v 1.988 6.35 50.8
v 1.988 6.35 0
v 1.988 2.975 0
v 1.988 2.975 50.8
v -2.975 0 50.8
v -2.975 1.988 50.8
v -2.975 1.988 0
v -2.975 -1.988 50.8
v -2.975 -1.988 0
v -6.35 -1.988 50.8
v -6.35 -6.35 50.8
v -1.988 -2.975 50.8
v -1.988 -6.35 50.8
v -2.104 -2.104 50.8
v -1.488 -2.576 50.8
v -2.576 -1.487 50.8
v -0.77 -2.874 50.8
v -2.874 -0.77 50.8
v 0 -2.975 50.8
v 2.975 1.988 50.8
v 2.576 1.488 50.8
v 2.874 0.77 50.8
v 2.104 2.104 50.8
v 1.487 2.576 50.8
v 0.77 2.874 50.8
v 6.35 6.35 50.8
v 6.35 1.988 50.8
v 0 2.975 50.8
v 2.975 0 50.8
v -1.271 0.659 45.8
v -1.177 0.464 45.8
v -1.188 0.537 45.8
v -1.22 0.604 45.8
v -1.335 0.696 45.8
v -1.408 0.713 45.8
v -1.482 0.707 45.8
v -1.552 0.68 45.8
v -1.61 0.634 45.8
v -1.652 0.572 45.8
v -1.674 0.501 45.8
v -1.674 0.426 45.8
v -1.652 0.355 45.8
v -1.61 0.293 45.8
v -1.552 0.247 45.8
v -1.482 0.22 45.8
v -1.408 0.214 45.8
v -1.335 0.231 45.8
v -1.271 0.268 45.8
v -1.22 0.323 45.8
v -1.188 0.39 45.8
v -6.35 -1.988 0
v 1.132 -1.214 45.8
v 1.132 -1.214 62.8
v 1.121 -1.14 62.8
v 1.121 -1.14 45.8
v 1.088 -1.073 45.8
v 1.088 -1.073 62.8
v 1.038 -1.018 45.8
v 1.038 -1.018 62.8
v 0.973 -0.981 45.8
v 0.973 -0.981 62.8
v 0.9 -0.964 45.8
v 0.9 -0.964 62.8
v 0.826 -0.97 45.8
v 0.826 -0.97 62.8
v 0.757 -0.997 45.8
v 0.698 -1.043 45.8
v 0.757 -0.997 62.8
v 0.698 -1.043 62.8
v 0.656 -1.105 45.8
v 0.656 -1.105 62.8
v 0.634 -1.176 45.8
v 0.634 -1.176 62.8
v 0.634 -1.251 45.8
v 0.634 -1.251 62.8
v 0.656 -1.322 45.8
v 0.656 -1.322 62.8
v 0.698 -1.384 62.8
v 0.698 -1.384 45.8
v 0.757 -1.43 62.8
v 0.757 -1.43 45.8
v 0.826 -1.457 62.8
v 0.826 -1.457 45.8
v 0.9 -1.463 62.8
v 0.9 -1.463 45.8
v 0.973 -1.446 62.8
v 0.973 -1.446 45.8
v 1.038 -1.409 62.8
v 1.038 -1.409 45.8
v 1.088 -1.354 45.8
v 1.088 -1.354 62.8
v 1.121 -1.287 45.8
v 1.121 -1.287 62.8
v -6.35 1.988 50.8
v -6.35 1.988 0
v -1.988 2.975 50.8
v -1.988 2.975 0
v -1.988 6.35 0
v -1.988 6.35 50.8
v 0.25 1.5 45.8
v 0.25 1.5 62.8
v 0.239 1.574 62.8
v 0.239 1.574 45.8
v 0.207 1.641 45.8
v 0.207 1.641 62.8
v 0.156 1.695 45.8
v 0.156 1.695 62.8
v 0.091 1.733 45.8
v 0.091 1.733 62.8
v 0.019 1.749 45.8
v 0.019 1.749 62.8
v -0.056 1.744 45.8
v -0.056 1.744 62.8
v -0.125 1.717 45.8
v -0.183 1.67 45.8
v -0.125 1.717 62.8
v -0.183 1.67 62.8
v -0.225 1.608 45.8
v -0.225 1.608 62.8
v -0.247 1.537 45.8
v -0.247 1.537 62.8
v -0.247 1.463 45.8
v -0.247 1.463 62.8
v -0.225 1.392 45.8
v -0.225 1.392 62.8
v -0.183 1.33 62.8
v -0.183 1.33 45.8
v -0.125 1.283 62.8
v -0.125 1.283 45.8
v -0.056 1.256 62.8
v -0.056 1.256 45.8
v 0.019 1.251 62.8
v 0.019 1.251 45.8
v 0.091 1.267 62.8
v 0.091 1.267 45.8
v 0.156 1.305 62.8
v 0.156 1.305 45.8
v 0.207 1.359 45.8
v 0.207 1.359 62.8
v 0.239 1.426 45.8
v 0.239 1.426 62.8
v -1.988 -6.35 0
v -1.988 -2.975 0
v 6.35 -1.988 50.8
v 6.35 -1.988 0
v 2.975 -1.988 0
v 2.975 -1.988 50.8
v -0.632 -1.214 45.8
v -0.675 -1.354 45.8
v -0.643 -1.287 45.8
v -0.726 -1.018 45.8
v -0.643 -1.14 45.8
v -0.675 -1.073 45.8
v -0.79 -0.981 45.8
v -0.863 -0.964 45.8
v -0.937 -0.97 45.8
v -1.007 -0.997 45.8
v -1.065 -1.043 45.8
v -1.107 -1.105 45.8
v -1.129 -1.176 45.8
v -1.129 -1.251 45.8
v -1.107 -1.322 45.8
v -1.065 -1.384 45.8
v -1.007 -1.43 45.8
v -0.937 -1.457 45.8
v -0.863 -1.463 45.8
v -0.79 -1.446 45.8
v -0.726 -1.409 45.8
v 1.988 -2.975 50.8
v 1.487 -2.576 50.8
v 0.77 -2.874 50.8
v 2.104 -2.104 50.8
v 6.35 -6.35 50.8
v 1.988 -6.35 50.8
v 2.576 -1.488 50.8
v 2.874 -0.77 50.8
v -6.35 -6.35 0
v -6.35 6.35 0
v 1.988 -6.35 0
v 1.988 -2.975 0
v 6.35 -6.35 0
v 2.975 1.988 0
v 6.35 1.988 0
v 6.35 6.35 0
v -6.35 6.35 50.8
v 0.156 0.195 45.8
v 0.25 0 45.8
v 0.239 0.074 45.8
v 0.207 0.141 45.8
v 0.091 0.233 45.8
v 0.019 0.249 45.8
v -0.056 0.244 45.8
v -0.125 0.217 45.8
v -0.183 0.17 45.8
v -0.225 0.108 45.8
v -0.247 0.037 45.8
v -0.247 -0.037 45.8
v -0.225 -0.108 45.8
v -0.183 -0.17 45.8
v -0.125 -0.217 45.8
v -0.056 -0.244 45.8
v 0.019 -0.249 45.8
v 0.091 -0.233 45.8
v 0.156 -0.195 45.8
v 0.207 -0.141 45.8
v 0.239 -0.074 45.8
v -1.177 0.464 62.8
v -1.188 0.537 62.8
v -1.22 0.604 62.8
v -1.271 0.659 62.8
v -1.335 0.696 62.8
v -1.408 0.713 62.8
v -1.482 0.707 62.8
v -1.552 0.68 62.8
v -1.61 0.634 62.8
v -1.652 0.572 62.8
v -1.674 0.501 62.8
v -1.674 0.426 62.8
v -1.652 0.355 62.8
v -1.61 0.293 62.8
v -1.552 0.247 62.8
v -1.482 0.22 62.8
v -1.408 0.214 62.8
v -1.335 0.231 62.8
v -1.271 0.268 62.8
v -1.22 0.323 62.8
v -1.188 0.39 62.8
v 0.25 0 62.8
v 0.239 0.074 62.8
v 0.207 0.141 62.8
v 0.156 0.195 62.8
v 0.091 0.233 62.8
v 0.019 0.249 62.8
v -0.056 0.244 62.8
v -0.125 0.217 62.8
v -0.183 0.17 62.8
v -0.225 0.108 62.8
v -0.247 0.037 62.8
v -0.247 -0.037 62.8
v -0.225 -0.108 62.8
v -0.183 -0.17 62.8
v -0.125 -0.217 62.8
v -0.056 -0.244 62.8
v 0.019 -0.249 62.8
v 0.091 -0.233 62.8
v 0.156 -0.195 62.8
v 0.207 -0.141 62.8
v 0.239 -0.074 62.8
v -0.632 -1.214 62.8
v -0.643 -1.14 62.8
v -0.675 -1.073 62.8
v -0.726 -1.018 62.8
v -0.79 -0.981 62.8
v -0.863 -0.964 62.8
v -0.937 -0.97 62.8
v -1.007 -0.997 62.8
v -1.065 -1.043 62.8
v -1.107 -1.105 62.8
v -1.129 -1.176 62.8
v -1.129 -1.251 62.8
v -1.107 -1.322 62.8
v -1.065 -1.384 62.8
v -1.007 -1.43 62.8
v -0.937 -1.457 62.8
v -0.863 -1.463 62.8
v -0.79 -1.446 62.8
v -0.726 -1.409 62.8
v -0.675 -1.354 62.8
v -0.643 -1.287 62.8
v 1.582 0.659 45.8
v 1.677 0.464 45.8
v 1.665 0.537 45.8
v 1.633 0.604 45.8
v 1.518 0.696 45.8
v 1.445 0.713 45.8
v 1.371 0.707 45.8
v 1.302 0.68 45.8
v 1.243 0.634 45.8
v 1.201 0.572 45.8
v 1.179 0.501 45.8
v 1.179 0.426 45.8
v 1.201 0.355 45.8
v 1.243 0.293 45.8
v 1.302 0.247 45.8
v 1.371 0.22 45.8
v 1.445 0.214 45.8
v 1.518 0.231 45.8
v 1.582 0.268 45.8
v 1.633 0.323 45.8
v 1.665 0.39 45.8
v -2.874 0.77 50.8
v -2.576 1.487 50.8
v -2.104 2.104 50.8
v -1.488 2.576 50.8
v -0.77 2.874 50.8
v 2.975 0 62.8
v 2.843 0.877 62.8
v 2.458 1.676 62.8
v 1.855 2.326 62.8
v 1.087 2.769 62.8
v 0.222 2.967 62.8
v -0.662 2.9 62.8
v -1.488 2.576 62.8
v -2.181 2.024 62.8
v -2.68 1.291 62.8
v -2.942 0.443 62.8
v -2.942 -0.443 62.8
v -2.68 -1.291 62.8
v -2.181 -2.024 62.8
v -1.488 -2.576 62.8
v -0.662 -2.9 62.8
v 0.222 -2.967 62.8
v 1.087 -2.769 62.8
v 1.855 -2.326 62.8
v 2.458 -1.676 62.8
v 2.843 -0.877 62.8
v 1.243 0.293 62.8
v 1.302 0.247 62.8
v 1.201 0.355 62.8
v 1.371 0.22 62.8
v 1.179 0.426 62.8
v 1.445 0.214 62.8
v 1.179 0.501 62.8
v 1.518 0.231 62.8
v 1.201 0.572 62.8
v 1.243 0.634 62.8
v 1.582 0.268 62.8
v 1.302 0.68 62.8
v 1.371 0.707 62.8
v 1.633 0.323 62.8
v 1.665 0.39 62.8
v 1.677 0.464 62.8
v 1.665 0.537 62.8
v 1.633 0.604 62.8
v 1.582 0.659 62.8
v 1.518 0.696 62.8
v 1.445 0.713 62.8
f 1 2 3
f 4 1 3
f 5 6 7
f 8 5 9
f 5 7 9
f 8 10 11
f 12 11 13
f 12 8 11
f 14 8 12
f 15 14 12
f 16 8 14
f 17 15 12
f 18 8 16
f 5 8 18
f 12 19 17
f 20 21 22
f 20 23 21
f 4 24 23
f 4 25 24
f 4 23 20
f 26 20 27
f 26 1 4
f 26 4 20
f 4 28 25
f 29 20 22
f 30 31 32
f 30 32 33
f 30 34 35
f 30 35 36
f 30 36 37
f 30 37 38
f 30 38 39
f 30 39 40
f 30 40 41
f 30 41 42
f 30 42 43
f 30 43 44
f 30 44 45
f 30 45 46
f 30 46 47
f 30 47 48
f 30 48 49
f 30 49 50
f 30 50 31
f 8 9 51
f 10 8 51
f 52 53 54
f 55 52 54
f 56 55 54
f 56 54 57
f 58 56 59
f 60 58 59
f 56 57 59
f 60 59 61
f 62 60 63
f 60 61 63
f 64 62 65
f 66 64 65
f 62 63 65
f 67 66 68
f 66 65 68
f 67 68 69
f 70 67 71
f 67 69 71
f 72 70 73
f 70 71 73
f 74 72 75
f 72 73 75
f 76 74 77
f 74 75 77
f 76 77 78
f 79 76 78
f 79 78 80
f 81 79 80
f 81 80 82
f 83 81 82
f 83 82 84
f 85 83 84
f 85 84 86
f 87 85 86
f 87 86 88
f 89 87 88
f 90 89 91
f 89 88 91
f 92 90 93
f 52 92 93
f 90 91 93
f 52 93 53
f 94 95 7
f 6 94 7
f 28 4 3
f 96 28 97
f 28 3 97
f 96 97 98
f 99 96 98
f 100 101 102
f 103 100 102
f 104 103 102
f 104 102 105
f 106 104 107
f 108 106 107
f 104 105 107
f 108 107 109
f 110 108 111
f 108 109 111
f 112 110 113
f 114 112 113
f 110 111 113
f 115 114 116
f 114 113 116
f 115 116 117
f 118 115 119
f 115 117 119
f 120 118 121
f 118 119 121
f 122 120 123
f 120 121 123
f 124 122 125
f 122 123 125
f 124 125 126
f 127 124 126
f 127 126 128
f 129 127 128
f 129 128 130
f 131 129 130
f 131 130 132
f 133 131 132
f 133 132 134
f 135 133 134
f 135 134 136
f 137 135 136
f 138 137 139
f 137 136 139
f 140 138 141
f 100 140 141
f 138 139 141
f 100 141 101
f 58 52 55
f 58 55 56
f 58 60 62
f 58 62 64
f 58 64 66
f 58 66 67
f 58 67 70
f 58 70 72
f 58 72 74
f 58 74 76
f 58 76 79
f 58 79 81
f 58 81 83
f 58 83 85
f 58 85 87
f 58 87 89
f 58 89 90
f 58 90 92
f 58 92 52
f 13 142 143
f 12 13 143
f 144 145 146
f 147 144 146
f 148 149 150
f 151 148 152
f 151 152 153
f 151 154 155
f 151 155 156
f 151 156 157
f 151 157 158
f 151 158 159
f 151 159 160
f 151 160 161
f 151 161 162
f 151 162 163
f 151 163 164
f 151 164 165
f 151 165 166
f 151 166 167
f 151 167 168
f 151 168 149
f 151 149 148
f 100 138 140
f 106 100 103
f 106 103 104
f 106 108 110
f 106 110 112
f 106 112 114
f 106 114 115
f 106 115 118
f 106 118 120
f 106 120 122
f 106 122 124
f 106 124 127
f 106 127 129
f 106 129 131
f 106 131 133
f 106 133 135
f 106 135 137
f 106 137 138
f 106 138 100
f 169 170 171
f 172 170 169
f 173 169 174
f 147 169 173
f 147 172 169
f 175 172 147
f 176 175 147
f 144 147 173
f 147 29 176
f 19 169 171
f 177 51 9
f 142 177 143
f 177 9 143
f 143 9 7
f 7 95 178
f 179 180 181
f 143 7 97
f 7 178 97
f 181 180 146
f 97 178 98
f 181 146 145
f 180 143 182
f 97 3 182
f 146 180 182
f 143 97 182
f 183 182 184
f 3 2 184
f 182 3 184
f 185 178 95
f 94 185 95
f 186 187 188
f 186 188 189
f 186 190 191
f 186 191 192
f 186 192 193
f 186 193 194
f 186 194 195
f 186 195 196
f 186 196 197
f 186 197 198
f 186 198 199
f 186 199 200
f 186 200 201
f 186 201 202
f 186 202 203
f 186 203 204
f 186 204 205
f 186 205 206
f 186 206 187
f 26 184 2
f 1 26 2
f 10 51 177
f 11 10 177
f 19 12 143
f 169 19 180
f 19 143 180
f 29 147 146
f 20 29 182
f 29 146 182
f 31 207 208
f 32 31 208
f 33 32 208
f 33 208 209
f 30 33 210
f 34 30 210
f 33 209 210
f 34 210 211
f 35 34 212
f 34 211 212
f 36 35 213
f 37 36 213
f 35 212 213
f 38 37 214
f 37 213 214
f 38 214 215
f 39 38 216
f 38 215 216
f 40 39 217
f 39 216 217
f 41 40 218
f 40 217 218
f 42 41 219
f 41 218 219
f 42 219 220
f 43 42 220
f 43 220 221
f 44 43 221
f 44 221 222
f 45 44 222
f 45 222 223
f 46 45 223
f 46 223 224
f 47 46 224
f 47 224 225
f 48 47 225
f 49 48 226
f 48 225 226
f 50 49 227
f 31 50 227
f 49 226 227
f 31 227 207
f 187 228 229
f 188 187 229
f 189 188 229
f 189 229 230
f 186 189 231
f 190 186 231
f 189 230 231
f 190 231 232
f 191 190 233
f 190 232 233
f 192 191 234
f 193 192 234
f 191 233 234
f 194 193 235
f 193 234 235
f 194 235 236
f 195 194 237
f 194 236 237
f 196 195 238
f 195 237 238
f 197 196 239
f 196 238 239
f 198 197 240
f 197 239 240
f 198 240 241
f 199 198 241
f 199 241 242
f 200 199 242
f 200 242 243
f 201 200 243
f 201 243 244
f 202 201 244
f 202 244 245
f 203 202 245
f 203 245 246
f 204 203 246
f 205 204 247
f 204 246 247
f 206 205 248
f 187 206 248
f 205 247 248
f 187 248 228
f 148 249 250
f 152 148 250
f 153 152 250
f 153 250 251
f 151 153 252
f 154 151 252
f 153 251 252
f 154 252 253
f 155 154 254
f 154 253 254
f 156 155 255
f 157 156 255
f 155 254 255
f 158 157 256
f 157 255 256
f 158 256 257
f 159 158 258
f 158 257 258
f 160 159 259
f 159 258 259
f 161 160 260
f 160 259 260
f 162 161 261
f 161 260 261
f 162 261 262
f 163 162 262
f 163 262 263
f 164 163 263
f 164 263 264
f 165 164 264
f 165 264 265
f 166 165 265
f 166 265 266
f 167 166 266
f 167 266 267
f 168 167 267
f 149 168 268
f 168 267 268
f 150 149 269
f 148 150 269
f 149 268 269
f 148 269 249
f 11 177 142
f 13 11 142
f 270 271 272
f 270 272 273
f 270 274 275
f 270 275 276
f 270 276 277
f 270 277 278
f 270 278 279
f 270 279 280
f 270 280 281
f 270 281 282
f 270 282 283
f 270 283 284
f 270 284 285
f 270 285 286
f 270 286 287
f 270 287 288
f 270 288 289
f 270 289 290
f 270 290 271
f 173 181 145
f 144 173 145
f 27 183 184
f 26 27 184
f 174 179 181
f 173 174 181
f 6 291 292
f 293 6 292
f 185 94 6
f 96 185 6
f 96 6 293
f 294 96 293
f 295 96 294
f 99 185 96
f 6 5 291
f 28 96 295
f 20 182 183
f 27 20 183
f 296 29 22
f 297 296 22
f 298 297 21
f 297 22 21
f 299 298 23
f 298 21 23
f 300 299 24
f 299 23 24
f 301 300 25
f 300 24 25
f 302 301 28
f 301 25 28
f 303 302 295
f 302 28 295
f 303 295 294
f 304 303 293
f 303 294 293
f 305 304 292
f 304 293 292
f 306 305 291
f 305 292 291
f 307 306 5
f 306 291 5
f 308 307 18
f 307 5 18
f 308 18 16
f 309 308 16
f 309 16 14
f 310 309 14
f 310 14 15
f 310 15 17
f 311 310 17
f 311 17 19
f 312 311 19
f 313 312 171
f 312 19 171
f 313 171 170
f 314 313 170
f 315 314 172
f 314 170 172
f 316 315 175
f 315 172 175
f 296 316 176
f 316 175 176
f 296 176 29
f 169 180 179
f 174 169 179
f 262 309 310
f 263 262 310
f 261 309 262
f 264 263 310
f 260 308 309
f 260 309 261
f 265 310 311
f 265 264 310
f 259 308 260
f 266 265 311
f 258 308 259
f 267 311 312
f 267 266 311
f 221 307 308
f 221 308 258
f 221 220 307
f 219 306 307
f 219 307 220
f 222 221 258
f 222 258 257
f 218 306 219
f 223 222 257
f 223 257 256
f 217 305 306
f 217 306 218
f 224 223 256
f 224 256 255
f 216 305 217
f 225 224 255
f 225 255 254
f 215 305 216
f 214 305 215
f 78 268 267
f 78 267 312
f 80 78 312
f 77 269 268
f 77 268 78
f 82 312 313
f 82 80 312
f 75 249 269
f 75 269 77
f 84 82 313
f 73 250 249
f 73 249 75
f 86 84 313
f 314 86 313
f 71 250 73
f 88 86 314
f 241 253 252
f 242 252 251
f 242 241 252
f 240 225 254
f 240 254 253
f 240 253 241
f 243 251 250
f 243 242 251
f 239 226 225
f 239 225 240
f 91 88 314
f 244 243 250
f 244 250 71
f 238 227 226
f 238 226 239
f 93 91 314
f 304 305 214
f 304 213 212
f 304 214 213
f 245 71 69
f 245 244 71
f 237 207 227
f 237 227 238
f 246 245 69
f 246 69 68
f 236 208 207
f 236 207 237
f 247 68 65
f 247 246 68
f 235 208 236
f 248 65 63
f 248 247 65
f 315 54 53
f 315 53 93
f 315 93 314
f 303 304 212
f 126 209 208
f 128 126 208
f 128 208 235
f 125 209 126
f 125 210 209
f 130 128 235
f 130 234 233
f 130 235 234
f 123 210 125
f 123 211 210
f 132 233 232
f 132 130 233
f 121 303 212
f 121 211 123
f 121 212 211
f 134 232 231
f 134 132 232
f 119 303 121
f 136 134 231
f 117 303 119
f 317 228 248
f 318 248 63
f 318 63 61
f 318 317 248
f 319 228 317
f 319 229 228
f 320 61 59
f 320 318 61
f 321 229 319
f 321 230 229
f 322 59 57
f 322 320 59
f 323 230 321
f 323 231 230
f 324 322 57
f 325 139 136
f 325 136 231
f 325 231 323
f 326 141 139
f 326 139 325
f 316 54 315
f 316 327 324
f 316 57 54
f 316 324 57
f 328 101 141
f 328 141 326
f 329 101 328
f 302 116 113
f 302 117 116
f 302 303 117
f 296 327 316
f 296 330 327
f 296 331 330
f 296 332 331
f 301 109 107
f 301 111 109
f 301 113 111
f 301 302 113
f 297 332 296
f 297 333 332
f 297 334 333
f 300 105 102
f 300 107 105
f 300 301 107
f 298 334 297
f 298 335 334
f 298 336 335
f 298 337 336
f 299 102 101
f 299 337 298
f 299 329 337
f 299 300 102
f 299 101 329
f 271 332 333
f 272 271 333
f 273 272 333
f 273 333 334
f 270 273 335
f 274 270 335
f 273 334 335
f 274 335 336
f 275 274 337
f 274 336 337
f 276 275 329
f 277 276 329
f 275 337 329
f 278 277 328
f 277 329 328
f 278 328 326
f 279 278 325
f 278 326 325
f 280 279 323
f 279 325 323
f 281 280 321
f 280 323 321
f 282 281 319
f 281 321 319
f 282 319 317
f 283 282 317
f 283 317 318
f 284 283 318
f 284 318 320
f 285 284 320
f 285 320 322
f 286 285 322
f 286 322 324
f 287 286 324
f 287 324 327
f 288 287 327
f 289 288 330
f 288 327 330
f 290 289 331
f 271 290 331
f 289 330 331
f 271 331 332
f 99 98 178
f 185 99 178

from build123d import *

# Parameters (mm, degrees)
F1_DEPTH = 50.8
F2_R     = 2.975
F3_DEPTH = 12
F4_R     = 0.25
F5_DEPTH = 17


with BuildPart() as f1:
    # F0 (on Top) → F1 (new body)
    with BuildSketch(Plane.XY):
        Polygon((-1.9875, 6.35), (-6.35, 6.35), (-6.35, 1.9875), (-2.975, 1.9875), (-2.975, -1.9875), (-6.35, -1.9875), (-6.35, -6.35), (-1.9875, -6.35), (-1.9875, -2.975), (1.9875, -2.975), (1.9875, -6.35), (6.35, -6.35), (6.35, -1.9875), (2.975, -1.9875), (2.975, 1.9875), (6.35, 1.9875), (6.35, 6.35), (1.9875, 6.35), (1.9875, 2.975), (-1.9875, 2.975), align=None)
    extrude(amount=F1_DEPTH)

    # F2 (on face) → F3 (join)
    with BuildSketch(Plane.XY.offset(50.8)):
        Circle(F2_R)
    extrude(amount=F3_DEPTH)

    # F4 (on face) → F5 (cut)
    with BuildSketch(Plane.XY.offset(62.8)):
        with Locations((0, 1.5)):
            Circle(F4_R)
        with Locations((-1.426585, 0.463525)):
            Circle(F4_R)
        with Locations((-0.881678, -1.213525)):
            Circle(F4_R)
        with Locations((0.881678, -1.213525)):
            Circle(F4_R)
        Circle(F4_R)
        with Locations((1.426585, 0.463525)):
            Circle(F4_R)
    extrude(amount=-F5_DEPTH, mode=Mode.SUBTRACT)


solid = f1.part
